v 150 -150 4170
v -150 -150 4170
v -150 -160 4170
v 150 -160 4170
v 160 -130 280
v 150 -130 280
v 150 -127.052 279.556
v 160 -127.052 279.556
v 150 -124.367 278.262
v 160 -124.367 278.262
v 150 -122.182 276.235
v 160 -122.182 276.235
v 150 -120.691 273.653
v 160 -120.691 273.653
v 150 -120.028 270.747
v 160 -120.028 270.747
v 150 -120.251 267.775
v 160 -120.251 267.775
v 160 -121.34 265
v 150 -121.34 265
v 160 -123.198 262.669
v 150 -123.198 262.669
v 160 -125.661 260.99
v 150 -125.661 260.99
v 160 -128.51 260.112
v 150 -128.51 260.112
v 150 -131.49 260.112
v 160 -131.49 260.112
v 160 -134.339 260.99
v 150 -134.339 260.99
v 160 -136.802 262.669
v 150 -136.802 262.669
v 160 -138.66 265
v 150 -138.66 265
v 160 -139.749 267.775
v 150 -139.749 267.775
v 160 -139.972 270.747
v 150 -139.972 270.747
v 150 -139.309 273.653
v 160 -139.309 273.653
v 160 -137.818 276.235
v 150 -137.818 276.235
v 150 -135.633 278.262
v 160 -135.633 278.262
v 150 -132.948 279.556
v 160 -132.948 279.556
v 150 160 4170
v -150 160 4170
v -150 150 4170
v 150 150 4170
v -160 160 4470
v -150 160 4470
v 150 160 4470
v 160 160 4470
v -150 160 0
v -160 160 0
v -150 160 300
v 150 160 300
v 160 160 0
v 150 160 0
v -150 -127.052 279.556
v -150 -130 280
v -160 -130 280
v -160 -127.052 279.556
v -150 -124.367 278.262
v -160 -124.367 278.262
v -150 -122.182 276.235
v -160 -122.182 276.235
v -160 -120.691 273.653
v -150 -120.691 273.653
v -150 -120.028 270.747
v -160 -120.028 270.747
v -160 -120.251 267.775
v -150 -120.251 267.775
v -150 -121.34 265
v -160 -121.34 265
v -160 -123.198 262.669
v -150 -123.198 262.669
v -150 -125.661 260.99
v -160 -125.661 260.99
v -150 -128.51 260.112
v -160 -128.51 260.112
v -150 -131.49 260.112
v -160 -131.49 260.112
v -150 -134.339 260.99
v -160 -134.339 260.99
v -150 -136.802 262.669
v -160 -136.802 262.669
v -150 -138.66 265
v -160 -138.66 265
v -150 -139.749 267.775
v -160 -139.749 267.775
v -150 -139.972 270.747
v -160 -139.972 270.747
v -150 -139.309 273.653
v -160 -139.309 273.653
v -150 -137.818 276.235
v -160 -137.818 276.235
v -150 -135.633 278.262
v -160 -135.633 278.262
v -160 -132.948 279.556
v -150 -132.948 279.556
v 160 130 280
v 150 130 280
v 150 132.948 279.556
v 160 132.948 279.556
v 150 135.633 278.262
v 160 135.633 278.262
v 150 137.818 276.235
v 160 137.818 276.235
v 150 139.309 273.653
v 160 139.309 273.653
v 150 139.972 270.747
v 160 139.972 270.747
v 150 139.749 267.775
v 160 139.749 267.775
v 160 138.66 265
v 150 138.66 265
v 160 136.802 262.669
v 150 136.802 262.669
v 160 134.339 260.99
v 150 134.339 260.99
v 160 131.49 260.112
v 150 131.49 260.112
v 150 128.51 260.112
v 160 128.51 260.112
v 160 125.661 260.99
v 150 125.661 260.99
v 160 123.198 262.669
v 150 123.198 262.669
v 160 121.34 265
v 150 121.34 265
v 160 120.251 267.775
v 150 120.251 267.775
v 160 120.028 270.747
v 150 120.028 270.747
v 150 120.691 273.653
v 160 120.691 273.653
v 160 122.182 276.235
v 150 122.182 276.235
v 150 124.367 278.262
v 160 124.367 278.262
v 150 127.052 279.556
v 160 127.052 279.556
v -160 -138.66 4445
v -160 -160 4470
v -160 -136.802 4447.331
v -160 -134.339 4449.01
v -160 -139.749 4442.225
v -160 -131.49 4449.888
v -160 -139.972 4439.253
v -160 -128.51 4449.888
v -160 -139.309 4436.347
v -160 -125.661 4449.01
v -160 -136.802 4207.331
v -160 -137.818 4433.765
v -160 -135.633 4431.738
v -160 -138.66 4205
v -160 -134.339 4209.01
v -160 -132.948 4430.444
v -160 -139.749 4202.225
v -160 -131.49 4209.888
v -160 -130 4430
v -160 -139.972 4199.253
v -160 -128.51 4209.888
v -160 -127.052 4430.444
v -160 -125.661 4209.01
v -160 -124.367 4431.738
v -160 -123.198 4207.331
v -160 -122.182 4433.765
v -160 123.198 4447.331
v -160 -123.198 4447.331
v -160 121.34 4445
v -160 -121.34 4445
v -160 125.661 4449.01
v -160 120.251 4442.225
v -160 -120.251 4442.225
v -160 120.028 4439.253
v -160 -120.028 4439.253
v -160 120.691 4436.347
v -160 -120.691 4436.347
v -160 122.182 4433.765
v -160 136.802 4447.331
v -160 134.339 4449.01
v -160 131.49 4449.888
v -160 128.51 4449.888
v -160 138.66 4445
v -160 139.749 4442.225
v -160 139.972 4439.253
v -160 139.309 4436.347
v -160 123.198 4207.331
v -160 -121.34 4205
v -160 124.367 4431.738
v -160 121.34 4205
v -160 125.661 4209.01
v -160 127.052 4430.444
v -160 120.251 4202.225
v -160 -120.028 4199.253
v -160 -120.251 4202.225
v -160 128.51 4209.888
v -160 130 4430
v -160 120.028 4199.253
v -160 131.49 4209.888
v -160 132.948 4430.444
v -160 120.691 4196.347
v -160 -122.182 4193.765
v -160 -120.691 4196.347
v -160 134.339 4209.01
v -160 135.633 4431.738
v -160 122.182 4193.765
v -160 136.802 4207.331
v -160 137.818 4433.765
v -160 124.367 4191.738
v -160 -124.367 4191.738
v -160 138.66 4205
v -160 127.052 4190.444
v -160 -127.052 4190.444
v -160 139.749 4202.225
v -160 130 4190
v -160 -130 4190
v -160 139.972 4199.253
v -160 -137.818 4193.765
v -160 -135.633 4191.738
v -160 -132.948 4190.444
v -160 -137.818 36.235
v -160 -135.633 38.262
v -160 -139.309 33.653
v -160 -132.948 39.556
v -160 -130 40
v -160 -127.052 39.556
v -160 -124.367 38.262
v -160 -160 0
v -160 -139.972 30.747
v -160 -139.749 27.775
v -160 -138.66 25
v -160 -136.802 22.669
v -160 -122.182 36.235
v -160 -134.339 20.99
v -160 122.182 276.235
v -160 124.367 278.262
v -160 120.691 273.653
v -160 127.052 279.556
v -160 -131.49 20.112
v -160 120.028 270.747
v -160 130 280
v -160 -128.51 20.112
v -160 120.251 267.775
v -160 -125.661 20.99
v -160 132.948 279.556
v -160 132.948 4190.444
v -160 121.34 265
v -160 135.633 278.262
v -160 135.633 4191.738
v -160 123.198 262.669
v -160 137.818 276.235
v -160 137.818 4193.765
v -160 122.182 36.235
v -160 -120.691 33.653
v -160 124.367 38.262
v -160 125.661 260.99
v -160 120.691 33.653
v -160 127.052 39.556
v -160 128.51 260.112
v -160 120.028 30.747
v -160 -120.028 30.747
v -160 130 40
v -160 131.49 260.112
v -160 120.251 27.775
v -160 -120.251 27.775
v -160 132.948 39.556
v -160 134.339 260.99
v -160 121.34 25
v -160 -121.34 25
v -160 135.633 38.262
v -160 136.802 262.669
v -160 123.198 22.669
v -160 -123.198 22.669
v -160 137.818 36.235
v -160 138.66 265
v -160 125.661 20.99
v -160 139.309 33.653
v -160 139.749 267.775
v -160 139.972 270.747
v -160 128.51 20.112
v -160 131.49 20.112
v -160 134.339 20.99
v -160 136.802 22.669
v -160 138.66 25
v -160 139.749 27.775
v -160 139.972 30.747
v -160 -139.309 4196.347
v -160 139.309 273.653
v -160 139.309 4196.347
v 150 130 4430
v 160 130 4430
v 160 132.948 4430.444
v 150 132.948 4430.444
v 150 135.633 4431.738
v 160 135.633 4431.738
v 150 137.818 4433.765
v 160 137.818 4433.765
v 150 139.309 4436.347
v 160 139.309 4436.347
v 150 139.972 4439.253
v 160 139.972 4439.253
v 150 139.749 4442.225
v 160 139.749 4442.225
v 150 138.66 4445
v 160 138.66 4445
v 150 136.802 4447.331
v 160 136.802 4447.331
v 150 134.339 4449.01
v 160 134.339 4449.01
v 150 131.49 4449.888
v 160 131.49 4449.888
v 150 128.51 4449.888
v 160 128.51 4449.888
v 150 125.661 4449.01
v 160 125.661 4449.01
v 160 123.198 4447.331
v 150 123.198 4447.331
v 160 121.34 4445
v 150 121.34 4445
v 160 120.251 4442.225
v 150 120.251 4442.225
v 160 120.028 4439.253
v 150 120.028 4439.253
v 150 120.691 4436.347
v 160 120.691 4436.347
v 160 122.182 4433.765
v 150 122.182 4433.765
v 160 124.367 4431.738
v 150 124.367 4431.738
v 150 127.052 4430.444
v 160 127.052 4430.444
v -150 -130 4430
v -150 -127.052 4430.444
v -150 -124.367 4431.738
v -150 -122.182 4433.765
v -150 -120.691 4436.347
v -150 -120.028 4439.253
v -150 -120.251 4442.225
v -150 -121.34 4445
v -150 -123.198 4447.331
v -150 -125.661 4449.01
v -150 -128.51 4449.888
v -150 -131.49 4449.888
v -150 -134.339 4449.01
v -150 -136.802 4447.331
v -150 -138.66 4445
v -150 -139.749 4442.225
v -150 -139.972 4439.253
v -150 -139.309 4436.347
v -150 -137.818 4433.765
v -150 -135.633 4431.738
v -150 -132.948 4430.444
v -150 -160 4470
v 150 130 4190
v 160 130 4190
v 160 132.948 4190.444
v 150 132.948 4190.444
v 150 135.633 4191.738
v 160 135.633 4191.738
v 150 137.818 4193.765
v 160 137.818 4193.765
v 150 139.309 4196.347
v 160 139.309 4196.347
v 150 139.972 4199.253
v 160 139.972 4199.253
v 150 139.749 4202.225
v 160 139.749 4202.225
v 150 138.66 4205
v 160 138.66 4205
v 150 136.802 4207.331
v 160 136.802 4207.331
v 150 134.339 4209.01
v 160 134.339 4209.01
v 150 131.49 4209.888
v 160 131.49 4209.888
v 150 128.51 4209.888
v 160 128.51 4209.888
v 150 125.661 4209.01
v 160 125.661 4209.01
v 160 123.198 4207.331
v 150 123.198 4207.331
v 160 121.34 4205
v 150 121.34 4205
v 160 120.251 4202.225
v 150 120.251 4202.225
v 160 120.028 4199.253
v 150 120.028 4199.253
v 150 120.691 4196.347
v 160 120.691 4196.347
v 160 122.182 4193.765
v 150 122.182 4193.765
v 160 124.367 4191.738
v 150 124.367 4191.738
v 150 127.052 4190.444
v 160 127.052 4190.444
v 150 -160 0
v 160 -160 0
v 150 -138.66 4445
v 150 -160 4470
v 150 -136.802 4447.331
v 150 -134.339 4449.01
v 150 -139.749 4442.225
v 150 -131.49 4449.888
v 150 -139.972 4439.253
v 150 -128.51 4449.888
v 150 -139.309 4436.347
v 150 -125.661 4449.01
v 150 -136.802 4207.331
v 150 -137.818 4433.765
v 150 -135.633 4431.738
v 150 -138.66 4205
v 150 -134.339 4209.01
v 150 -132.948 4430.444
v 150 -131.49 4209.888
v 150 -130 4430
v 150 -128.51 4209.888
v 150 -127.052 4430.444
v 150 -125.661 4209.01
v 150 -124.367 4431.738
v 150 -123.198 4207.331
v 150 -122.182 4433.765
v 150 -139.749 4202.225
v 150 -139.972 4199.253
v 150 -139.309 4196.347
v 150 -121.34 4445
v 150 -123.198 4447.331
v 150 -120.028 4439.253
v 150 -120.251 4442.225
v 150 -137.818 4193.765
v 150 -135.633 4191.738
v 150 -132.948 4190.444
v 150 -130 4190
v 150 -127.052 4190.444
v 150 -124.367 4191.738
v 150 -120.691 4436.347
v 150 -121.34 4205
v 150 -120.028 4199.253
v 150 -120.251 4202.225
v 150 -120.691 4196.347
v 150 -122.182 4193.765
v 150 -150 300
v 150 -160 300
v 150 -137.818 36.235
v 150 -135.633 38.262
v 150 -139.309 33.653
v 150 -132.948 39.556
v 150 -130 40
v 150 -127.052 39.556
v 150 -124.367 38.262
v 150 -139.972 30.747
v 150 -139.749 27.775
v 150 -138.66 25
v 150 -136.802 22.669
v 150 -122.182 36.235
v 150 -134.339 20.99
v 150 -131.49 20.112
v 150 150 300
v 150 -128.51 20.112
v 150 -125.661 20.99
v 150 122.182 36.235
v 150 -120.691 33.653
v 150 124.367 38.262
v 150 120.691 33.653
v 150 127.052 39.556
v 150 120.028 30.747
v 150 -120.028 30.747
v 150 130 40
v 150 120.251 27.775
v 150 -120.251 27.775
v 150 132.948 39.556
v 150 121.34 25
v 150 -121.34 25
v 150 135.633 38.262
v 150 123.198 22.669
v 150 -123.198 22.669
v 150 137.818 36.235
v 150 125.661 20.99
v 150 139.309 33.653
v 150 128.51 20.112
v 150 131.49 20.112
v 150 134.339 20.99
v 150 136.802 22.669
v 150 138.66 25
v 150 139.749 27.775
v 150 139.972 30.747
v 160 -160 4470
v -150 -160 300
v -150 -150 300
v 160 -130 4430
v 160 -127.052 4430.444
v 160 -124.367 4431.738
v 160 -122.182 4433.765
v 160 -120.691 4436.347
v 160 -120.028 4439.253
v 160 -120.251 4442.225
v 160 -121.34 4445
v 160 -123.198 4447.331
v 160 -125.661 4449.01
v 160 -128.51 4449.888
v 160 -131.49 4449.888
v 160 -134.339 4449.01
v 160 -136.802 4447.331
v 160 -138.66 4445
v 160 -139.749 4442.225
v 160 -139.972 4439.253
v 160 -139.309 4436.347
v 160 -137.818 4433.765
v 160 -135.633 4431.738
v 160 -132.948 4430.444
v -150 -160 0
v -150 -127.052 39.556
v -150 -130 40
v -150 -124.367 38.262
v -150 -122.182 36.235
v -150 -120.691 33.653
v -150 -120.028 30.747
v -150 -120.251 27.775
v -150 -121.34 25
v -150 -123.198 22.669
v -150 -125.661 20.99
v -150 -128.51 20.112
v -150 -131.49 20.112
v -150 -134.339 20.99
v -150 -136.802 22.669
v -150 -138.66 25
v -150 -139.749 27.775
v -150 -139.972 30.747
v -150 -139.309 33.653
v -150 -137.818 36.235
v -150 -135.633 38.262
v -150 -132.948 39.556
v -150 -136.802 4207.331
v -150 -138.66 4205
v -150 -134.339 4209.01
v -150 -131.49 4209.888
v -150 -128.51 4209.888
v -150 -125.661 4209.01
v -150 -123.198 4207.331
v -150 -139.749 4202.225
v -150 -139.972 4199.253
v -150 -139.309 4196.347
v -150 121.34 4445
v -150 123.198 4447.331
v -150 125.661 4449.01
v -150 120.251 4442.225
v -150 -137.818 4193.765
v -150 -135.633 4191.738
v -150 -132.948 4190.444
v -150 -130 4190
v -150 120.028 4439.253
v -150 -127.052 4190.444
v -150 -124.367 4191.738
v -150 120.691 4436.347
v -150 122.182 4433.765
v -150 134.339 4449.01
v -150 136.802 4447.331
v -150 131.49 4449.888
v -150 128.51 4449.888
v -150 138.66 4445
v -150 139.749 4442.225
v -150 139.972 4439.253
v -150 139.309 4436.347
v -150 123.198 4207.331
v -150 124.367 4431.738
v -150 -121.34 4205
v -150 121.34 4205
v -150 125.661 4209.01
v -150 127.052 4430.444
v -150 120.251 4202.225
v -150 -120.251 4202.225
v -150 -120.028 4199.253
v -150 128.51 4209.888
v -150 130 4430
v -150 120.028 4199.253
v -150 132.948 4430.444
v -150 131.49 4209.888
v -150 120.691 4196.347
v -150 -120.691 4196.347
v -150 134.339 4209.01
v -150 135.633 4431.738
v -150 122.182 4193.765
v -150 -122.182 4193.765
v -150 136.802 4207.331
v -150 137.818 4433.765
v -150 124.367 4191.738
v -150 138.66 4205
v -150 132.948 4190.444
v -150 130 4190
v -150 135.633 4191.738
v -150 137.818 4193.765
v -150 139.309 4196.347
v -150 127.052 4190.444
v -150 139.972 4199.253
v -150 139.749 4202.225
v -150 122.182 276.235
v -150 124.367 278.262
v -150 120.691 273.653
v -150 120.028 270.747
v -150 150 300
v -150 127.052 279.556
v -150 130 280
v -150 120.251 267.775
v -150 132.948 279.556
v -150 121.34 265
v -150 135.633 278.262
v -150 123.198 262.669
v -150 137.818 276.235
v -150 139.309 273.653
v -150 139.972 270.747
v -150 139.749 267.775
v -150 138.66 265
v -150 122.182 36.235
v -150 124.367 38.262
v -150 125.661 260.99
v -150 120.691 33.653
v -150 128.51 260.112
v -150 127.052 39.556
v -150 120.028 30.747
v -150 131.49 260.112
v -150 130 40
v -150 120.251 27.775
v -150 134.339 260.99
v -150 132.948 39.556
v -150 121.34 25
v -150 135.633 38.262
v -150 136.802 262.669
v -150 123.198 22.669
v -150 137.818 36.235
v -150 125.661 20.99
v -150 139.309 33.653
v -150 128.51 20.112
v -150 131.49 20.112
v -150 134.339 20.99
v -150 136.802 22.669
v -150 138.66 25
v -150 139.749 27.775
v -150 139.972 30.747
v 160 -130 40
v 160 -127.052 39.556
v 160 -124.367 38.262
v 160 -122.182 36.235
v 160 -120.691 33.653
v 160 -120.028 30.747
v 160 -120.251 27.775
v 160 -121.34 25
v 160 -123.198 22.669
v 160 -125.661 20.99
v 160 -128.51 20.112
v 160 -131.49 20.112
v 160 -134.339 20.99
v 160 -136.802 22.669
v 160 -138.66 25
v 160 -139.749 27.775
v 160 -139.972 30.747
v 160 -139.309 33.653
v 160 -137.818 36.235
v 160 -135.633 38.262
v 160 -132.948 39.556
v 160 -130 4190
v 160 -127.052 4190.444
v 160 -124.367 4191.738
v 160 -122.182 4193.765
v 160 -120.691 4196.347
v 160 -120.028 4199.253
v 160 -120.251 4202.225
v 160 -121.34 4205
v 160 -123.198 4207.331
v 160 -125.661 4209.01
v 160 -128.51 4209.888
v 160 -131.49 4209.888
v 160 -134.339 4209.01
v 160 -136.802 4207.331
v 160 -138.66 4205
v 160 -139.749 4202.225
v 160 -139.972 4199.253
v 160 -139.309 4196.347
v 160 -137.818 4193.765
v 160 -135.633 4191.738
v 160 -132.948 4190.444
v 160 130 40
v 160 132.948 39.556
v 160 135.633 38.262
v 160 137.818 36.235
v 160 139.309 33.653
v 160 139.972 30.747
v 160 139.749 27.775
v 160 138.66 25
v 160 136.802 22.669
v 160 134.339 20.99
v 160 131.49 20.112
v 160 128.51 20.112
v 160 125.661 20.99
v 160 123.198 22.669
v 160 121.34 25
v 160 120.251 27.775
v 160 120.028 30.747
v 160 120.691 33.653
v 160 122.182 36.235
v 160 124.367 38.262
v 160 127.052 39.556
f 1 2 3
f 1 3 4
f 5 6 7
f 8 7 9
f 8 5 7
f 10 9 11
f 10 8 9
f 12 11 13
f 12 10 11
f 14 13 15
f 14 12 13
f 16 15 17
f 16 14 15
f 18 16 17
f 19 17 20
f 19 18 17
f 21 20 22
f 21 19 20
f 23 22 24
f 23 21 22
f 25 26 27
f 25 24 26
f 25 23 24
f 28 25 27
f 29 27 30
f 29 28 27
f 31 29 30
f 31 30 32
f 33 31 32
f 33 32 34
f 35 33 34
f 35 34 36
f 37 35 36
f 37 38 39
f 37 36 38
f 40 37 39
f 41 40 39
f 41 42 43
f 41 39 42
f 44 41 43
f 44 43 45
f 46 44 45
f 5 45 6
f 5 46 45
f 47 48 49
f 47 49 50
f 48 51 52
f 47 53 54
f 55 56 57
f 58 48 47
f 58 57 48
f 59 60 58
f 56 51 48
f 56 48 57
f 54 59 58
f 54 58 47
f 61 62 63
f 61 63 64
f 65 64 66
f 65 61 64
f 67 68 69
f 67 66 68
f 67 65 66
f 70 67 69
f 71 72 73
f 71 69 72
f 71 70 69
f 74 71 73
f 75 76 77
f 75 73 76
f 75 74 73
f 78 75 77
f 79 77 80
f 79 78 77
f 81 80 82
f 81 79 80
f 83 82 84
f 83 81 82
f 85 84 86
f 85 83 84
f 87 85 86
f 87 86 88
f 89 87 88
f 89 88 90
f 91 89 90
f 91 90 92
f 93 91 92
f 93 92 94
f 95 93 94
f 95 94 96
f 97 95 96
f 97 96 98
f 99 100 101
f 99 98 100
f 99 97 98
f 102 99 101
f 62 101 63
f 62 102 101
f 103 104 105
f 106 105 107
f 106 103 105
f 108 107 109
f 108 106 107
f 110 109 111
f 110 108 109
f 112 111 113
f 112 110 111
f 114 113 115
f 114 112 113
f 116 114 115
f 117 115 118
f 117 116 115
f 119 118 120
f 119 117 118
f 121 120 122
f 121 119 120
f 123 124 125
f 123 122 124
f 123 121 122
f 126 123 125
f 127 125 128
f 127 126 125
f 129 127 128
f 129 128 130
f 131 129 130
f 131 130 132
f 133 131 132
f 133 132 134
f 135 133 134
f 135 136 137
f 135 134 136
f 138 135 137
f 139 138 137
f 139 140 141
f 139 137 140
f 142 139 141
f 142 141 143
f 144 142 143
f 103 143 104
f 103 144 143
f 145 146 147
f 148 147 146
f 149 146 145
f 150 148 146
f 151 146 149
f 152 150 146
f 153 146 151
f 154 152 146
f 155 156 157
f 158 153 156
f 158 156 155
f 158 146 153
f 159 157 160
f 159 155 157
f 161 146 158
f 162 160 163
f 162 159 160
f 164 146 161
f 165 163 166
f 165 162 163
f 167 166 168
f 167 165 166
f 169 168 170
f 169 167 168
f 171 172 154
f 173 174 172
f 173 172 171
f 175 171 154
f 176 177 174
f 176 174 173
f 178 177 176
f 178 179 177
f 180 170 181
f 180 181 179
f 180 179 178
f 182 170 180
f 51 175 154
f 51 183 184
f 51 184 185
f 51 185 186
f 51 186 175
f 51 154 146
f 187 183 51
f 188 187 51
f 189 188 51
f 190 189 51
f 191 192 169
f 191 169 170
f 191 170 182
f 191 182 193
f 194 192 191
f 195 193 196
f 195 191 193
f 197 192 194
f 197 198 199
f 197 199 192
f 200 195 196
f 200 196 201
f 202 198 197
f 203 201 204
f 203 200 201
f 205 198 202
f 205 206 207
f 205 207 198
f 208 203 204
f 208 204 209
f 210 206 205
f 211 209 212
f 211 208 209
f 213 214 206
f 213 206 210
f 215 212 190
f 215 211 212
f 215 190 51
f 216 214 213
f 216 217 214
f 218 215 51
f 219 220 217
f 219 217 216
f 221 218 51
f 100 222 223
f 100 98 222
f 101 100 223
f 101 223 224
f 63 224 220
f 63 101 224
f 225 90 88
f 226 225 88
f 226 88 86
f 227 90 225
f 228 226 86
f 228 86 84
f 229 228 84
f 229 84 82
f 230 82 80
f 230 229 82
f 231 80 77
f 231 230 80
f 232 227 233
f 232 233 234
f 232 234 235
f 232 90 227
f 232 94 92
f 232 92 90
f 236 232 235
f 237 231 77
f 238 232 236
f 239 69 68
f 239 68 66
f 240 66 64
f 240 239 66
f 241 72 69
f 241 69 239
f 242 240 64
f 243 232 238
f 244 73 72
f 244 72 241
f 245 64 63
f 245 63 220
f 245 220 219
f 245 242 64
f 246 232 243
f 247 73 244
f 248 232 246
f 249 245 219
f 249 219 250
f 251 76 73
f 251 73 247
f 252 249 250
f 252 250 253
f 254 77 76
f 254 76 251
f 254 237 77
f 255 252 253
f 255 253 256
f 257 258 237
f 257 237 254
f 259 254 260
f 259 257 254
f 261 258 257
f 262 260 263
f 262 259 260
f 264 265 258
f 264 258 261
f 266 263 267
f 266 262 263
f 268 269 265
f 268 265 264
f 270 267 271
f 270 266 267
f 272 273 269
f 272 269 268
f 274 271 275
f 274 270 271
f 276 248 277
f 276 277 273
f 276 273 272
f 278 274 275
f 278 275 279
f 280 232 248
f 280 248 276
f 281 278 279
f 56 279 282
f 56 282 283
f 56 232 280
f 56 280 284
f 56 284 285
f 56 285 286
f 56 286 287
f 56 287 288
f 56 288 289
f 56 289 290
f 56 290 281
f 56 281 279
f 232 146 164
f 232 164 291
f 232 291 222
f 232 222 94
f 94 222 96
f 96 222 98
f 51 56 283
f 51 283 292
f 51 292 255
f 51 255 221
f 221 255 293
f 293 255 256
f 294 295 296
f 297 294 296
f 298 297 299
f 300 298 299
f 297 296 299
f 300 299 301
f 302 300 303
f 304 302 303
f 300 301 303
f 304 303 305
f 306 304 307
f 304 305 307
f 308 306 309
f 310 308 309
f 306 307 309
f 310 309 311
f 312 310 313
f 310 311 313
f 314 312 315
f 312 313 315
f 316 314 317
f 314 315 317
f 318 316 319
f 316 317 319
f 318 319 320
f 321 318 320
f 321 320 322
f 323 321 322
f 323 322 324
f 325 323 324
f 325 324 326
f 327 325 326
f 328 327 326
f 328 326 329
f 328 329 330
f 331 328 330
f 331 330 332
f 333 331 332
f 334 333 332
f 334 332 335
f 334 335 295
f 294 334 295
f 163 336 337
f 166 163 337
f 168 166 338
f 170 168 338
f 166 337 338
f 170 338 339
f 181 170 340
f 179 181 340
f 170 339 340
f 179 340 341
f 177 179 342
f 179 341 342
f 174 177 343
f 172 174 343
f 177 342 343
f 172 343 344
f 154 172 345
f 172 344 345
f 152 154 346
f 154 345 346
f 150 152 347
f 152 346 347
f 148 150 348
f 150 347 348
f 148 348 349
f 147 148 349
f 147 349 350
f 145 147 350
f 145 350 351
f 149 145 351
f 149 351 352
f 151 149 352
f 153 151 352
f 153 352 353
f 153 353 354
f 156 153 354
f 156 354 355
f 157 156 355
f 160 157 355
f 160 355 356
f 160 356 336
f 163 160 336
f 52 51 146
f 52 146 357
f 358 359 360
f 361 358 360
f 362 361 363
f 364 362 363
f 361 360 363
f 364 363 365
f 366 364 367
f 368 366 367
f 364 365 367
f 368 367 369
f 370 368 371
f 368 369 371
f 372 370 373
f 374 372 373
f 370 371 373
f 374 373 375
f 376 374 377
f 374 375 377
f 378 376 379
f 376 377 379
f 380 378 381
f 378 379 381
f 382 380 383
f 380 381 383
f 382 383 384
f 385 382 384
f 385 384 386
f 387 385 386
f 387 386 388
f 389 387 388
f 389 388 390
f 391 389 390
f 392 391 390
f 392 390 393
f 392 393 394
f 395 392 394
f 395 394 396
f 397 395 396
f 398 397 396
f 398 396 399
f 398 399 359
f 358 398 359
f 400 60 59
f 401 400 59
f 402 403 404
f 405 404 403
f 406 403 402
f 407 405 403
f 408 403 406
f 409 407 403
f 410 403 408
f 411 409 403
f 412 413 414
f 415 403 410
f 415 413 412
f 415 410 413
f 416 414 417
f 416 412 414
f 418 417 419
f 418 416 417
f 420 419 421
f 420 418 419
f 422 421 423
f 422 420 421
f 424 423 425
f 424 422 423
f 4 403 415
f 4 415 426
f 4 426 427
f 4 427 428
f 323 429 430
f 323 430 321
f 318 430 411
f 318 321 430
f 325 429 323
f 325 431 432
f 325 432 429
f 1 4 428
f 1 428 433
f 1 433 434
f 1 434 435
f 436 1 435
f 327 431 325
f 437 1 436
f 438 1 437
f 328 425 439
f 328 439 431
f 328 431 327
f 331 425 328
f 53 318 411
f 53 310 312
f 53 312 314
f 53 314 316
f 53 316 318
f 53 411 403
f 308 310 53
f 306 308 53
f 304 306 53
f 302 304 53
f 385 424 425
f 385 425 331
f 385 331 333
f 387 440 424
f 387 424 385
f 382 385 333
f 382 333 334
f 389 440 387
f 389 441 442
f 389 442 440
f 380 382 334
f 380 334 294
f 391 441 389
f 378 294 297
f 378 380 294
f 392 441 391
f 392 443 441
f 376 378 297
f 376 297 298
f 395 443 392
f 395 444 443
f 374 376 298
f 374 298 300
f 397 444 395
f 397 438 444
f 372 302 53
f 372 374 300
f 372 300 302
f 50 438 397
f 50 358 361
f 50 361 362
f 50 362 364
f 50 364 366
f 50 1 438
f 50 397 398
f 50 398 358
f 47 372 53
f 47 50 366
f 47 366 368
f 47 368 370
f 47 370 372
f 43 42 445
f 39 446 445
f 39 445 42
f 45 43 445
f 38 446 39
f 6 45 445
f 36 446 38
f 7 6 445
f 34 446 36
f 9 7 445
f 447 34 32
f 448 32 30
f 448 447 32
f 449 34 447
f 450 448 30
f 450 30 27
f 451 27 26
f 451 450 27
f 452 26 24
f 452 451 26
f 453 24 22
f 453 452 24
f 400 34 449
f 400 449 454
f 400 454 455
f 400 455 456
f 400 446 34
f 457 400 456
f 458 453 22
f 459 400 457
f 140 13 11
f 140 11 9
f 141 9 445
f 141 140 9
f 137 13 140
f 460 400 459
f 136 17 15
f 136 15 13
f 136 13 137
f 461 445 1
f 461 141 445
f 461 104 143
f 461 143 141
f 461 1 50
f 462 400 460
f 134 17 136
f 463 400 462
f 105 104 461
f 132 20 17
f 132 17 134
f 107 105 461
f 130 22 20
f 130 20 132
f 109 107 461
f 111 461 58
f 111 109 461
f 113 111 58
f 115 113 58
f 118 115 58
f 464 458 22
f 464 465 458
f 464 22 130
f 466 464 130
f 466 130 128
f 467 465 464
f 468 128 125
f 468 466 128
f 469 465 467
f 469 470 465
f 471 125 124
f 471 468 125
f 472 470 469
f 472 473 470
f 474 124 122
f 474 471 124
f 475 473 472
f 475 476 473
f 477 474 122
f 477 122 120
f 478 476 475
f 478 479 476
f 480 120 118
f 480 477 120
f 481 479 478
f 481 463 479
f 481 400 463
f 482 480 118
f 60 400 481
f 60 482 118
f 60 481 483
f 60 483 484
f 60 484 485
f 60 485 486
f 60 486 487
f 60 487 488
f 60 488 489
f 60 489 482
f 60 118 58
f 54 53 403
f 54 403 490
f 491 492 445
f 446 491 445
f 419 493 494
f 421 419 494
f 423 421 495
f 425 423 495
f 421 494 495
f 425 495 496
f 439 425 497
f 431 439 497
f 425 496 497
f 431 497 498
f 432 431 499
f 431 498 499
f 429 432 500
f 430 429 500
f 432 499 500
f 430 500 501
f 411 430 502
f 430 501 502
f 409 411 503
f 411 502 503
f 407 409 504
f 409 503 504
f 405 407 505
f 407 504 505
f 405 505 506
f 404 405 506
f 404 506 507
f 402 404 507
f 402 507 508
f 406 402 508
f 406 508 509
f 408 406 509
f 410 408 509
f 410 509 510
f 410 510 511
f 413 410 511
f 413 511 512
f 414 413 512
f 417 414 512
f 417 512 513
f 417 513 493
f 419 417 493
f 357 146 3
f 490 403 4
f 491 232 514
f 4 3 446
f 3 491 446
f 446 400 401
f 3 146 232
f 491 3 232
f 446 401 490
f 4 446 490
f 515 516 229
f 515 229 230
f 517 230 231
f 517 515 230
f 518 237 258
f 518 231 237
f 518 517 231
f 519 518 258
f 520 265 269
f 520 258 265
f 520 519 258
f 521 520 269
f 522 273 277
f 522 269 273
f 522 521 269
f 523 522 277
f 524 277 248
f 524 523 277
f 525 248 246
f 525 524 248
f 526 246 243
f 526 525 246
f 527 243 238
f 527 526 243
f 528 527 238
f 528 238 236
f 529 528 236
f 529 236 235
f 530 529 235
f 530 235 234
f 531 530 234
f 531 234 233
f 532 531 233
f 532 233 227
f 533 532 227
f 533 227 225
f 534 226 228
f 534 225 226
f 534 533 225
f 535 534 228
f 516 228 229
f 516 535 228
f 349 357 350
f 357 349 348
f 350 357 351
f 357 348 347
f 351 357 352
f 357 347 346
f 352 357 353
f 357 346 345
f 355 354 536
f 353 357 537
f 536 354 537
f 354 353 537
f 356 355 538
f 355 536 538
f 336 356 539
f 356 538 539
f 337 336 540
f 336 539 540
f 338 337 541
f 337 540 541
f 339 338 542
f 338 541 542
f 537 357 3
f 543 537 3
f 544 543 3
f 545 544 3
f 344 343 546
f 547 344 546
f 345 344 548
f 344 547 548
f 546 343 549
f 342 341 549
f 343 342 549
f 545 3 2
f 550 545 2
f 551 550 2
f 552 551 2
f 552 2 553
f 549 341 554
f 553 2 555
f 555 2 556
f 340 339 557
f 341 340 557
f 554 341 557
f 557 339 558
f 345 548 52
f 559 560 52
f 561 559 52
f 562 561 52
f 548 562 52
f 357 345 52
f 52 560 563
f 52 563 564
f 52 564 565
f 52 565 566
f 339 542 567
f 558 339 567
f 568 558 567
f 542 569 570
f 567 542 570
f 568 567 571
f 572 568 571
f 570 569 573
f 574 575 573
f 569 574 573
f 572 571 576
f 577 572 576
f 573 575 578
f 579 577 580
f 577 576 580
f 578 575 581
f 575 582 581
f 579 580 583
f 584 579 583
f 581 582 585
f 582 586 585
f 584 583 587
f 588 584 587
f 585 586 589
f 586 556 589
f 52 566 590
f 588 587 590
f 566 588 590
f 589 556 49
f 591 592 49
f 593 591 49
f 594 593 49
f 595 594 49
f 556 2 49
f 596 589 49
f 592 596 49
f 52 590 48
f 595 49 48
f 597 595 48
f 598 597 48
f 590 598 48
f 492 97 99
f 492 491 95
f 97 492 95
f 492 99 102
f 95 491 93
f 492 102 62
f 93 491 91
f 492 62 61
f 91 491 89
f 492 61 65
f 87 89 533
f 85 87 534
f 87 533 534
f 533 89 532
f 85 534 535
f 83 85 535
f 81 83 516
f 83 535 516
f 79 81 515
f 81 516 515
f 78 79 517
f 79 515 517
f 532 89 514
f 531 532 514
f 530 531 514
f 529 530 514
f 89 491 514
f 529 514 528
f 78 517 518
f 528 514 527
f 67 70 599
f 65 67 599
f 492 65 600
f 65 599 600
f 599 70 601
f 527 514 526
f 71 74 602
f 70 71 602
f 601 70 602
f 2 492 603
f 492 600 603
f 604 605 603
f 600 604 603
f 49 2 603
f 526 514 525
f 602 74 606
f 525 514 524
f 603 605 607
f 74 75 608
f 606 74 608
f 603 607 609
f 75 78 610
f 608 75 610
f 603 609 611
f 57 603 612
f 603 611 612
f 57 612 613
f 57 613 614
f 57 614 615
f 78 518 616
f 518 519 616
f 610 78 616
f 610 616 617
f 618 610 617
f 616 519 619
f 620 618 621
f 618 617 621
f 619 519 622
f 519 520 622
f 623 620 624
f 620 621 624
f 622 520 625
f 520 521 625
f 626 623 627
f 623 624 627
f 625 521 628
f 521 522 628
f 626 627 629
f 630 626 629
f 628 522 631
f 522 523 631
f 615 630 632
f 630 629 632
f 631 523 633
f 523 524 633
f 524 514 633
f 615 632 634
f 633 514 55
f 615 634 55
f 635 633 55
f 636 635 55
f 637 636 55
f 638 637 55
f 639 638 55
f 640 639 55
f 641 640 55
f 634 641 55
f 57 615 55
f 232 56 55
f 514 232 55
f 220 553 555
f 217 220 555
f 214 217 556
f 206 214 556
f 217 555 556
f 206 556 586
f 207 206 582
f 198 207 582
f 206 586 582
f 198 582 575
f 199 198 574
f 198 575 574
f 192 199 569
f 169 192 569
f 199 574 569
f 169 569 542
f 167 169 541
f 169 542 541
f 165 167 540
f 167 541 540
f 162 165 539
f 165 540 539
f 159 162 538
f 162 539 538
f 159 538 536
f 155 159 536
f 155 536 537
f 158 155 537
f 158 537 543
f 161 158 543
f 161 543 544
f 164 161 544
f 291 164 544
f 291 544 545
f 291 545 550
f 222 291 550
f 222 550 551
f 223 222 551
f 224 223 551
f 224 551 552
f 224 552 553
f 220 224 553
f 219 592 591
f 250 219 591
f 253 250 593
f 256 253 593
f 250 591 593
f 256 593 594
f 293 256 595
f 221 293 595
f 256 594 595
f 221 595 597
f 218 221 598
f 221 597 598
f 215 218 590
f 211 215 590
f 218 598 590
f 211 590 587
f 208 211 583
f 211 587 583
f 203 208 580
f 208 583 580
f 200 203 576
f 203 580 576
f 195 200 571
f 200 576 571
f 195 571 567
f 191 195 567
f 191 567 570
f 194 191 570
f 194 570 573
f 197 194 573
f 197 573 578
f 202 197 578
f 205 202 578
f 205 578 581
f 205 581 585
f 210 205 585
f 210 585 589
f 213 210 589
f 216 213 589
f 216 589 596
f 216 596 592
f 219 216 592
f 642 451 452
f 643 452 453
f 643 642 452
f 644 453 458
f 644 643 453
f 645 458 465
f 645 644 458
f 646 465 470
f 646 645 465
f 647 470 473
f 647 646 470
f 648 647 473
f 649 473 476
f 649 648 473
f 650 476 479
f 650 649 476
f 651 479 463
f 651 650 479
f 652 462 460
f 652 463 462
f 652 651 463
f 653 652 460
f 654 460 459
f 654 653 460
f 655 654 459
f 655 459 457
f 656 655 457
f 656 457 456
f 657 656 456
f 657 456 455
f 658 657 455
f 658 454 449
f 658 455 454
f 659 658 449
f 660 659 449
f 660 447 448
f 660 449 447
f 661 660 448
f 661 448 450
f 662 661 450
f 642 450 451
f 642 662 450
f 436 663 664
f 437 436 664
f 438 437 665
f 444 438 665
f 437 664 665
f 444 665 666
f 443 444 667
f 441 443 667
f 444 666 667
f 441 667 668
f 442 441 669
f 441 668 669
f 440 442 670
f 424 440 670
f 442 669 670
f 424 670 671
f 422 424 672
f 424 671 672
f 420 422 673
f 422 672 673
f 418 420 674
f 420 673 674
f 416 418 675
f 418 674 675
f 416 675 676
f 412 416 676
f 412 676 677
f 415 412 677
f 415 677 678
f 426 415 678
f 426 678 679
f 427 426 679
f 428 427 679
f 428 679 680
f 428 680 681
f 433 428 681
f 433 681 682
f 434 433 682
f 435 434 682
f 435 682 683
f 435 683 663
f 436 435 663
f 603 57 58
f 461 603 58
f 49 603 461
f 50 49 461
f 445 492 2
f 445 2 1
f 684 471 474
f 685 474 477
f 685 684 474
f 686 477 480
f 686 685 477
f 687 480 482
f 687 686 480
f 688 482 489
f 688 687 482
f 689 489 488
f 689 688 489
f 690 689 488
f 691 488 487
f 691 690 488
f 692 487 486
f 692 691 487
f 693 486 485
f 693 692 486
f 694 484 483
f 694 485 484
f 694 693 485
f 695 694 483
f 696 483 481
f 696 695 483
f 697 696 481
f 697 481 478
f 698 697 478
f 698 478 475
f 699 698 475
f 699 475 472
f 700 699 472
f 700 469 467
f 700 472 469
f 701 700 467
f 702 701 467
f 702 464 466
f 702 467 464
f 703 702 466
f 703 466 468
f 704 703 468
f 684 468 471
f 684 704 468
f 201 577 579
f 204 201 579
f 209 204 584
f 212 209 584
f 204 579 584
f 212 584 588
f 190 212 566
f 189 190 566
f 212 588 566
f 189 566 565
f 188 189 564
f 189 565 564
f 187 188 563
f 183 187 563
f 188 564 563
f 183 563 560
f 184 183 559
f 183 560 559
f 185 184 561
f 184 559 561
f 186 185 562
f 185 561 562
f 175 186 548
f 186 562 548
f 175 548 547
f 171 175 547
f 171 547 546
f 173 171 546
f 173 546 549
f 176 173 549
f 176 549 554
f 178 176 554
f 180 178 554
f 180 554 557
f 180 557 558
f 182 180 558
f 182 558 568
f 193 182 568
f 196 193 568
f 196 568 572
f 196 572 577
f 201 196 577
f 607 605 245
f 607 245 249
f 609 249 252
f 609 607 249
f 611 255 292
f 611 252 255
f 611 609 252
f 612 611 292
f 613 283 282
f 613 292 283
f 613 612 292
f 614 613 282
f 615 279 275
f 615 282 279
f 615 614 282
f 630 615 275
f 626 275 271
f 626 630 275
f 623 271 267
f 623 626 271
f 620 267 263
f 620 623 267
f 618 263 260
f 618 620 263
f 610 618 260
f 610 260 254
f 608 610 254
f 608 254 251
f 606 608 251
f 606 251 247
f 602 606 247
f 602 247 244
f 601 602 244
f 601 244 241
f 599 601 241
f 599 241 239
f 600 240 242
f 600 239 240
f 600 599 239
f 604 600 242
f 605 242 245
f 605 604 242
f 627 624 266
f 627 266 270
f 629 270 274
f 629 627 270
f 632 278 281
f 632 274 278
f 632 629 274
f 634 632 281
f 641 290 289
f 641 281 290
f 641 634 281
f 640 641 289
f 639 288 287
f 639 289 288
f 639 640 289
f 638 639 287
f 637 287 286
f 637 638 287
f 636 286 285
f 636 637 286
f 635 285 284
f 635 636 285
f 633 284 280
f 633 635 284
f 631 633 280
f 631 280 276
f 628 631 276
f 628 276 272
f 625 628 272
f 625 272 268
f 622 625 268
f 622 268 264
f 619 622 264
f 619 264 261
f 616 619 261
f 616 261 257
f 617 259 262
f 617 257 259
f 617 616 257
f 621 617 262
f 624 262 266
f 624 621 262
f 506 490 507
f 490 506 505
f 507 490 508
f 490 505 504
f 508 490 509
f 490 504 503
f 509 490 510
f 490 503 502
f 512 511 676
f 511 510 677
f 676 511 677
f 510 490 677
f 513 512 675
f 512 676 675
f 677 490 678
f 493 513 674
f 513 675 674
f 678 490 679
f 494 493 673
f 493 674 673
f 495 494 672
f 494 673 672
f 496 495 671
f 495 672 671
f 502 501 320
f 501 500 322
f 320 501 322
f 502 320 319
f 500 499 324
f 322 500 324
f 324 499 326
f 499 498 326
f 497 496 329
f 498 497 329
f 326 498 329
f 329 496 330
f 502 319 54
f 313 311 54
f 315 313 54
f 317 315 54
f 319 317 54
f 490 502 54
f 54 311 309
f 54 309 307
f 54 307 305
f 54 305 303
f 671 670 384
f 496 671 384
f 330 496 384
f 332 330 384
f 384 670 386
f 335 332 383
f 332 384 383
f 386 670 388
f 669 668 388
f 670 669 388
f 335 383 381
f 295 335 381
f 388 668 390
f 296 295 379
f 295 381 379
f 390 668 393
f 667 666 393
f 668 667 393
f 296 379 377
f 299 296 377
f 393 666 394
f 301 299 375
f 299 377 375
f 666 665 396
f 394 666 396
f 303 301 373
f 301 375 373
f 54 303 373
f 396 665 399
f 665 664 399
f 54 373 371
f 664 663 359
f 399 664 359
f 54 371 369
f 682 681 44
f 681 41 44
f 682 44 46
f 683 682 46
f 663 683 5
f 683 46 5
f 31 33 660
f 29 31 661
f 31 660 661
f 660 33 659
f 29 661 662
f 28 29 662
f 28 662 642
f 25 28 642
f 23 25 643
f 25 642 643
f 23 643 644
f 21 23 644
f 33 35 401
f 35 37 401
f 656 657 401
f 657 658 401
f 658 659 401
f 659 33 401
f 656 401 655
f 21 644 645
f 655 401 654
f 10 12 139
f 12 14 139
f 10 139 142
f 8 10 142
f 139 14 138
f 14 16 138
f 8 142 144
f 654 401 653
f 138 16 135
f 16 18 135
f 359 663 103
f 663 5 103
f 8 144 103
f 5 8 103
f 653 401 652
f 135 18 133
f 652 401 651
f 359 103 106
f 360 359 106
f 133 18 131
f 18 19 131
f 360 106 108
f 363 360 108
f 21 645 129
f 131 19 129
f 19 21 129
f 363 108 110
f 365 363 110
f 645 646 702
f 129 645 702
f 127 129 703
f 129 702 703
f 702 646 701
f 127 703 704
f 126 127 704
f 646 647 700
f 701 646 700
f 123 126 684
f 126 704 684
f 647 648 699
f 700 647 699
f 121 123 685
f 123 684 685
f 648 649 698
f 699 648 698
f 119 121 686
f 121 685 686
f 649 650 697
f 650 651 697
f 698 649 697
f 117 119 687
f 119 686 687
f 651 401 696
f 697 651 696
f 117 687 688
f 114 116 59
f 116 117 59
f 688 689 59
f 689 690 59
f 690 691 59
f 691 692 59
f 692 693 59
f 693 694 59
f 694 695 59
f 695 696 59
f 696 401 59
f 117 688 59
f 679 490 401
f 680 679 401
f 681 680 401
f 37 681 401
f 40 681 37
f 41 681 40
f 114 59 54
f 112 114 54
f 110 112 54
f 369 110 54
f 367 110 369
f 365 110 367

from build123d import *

# Parameters (mm, degrees)
SKETCH1_W           = 320
SKETCH1_H           = 320
SKETCH1_W_2         = 300
SKETCH1_H_2         = 300
BOSS_EXTRUDE1_DEPTH = 4470
SKETCH2_W           = 300
SKETCH2_H           = 369.06637508
CUT_EXTRUDE1_DEPTH  = 300
SKETCH3_R           = 10
CUT_EXTRUDE2_DEPTH  = 321


with BuildPart() as part:
    # Sketch1 → Boss-Extrude1 (new body)
    with BuildSketch(Plane.XY):
        Rectangle(SKETCH1_W, SKETCH1_H)
        Rectangle(SKETCH1_W_2, SKETCH1_H_2, mode=Mode.SUBTRACT)
    extrude(amount=BOSS_EXTRUDE1_DEPTH)

    # Sketch2 → Cut-Extrude1 (cut)
    with BuildSketch(Plane.XY.offset(4470)):
        Rectangle(SKETCH2_W, SKETCH2_H)
    cut_extrude1 = extrude(amount=-CUT_EXTRUDE1_DEPTH, mode=Mode.SUBTRACT)

    # Sketch3 → Cut-Extrude2 (cut, through all)
    with BuildSketch(Plane(origin=(160, 0, 0), x_dir=(0, 0, -1), z_dir=(1, 0, 0))):
        with Locations((-4440, 130)):
            Circle(SKETCH3_R)
        with Locations((-4200, 130)):
            Circle(SKETCH3_R)
        with Locations((-4200, -130)):
            Circle(SKETCH3_R)
        with Locations((-4440, -130)):
            Circle(SKETCH3_R)
    cut_extrude2 = extrude(amount=-CUT_EXTRUDE2_DEPTH, mode=Mode.SUBTRACT)

    # Mirror1: Cut-Extrude1, Cut-Extrude2 across plane
    add(cut_extrude1.mirror(Plane(origin=(0, 0, 2235), x_dir=(1, 0, 0), z_dir=(0, 0, -1))), mode=Mode.SUBTRACT)
    add(cut_extrude2.mirror(Plane(origin=(0, 0, 2235), x_dir=(1, 0, 0), z_dir=(0, 0, -1))), mode=Mode.SUBTRACT)


solid = part.part
